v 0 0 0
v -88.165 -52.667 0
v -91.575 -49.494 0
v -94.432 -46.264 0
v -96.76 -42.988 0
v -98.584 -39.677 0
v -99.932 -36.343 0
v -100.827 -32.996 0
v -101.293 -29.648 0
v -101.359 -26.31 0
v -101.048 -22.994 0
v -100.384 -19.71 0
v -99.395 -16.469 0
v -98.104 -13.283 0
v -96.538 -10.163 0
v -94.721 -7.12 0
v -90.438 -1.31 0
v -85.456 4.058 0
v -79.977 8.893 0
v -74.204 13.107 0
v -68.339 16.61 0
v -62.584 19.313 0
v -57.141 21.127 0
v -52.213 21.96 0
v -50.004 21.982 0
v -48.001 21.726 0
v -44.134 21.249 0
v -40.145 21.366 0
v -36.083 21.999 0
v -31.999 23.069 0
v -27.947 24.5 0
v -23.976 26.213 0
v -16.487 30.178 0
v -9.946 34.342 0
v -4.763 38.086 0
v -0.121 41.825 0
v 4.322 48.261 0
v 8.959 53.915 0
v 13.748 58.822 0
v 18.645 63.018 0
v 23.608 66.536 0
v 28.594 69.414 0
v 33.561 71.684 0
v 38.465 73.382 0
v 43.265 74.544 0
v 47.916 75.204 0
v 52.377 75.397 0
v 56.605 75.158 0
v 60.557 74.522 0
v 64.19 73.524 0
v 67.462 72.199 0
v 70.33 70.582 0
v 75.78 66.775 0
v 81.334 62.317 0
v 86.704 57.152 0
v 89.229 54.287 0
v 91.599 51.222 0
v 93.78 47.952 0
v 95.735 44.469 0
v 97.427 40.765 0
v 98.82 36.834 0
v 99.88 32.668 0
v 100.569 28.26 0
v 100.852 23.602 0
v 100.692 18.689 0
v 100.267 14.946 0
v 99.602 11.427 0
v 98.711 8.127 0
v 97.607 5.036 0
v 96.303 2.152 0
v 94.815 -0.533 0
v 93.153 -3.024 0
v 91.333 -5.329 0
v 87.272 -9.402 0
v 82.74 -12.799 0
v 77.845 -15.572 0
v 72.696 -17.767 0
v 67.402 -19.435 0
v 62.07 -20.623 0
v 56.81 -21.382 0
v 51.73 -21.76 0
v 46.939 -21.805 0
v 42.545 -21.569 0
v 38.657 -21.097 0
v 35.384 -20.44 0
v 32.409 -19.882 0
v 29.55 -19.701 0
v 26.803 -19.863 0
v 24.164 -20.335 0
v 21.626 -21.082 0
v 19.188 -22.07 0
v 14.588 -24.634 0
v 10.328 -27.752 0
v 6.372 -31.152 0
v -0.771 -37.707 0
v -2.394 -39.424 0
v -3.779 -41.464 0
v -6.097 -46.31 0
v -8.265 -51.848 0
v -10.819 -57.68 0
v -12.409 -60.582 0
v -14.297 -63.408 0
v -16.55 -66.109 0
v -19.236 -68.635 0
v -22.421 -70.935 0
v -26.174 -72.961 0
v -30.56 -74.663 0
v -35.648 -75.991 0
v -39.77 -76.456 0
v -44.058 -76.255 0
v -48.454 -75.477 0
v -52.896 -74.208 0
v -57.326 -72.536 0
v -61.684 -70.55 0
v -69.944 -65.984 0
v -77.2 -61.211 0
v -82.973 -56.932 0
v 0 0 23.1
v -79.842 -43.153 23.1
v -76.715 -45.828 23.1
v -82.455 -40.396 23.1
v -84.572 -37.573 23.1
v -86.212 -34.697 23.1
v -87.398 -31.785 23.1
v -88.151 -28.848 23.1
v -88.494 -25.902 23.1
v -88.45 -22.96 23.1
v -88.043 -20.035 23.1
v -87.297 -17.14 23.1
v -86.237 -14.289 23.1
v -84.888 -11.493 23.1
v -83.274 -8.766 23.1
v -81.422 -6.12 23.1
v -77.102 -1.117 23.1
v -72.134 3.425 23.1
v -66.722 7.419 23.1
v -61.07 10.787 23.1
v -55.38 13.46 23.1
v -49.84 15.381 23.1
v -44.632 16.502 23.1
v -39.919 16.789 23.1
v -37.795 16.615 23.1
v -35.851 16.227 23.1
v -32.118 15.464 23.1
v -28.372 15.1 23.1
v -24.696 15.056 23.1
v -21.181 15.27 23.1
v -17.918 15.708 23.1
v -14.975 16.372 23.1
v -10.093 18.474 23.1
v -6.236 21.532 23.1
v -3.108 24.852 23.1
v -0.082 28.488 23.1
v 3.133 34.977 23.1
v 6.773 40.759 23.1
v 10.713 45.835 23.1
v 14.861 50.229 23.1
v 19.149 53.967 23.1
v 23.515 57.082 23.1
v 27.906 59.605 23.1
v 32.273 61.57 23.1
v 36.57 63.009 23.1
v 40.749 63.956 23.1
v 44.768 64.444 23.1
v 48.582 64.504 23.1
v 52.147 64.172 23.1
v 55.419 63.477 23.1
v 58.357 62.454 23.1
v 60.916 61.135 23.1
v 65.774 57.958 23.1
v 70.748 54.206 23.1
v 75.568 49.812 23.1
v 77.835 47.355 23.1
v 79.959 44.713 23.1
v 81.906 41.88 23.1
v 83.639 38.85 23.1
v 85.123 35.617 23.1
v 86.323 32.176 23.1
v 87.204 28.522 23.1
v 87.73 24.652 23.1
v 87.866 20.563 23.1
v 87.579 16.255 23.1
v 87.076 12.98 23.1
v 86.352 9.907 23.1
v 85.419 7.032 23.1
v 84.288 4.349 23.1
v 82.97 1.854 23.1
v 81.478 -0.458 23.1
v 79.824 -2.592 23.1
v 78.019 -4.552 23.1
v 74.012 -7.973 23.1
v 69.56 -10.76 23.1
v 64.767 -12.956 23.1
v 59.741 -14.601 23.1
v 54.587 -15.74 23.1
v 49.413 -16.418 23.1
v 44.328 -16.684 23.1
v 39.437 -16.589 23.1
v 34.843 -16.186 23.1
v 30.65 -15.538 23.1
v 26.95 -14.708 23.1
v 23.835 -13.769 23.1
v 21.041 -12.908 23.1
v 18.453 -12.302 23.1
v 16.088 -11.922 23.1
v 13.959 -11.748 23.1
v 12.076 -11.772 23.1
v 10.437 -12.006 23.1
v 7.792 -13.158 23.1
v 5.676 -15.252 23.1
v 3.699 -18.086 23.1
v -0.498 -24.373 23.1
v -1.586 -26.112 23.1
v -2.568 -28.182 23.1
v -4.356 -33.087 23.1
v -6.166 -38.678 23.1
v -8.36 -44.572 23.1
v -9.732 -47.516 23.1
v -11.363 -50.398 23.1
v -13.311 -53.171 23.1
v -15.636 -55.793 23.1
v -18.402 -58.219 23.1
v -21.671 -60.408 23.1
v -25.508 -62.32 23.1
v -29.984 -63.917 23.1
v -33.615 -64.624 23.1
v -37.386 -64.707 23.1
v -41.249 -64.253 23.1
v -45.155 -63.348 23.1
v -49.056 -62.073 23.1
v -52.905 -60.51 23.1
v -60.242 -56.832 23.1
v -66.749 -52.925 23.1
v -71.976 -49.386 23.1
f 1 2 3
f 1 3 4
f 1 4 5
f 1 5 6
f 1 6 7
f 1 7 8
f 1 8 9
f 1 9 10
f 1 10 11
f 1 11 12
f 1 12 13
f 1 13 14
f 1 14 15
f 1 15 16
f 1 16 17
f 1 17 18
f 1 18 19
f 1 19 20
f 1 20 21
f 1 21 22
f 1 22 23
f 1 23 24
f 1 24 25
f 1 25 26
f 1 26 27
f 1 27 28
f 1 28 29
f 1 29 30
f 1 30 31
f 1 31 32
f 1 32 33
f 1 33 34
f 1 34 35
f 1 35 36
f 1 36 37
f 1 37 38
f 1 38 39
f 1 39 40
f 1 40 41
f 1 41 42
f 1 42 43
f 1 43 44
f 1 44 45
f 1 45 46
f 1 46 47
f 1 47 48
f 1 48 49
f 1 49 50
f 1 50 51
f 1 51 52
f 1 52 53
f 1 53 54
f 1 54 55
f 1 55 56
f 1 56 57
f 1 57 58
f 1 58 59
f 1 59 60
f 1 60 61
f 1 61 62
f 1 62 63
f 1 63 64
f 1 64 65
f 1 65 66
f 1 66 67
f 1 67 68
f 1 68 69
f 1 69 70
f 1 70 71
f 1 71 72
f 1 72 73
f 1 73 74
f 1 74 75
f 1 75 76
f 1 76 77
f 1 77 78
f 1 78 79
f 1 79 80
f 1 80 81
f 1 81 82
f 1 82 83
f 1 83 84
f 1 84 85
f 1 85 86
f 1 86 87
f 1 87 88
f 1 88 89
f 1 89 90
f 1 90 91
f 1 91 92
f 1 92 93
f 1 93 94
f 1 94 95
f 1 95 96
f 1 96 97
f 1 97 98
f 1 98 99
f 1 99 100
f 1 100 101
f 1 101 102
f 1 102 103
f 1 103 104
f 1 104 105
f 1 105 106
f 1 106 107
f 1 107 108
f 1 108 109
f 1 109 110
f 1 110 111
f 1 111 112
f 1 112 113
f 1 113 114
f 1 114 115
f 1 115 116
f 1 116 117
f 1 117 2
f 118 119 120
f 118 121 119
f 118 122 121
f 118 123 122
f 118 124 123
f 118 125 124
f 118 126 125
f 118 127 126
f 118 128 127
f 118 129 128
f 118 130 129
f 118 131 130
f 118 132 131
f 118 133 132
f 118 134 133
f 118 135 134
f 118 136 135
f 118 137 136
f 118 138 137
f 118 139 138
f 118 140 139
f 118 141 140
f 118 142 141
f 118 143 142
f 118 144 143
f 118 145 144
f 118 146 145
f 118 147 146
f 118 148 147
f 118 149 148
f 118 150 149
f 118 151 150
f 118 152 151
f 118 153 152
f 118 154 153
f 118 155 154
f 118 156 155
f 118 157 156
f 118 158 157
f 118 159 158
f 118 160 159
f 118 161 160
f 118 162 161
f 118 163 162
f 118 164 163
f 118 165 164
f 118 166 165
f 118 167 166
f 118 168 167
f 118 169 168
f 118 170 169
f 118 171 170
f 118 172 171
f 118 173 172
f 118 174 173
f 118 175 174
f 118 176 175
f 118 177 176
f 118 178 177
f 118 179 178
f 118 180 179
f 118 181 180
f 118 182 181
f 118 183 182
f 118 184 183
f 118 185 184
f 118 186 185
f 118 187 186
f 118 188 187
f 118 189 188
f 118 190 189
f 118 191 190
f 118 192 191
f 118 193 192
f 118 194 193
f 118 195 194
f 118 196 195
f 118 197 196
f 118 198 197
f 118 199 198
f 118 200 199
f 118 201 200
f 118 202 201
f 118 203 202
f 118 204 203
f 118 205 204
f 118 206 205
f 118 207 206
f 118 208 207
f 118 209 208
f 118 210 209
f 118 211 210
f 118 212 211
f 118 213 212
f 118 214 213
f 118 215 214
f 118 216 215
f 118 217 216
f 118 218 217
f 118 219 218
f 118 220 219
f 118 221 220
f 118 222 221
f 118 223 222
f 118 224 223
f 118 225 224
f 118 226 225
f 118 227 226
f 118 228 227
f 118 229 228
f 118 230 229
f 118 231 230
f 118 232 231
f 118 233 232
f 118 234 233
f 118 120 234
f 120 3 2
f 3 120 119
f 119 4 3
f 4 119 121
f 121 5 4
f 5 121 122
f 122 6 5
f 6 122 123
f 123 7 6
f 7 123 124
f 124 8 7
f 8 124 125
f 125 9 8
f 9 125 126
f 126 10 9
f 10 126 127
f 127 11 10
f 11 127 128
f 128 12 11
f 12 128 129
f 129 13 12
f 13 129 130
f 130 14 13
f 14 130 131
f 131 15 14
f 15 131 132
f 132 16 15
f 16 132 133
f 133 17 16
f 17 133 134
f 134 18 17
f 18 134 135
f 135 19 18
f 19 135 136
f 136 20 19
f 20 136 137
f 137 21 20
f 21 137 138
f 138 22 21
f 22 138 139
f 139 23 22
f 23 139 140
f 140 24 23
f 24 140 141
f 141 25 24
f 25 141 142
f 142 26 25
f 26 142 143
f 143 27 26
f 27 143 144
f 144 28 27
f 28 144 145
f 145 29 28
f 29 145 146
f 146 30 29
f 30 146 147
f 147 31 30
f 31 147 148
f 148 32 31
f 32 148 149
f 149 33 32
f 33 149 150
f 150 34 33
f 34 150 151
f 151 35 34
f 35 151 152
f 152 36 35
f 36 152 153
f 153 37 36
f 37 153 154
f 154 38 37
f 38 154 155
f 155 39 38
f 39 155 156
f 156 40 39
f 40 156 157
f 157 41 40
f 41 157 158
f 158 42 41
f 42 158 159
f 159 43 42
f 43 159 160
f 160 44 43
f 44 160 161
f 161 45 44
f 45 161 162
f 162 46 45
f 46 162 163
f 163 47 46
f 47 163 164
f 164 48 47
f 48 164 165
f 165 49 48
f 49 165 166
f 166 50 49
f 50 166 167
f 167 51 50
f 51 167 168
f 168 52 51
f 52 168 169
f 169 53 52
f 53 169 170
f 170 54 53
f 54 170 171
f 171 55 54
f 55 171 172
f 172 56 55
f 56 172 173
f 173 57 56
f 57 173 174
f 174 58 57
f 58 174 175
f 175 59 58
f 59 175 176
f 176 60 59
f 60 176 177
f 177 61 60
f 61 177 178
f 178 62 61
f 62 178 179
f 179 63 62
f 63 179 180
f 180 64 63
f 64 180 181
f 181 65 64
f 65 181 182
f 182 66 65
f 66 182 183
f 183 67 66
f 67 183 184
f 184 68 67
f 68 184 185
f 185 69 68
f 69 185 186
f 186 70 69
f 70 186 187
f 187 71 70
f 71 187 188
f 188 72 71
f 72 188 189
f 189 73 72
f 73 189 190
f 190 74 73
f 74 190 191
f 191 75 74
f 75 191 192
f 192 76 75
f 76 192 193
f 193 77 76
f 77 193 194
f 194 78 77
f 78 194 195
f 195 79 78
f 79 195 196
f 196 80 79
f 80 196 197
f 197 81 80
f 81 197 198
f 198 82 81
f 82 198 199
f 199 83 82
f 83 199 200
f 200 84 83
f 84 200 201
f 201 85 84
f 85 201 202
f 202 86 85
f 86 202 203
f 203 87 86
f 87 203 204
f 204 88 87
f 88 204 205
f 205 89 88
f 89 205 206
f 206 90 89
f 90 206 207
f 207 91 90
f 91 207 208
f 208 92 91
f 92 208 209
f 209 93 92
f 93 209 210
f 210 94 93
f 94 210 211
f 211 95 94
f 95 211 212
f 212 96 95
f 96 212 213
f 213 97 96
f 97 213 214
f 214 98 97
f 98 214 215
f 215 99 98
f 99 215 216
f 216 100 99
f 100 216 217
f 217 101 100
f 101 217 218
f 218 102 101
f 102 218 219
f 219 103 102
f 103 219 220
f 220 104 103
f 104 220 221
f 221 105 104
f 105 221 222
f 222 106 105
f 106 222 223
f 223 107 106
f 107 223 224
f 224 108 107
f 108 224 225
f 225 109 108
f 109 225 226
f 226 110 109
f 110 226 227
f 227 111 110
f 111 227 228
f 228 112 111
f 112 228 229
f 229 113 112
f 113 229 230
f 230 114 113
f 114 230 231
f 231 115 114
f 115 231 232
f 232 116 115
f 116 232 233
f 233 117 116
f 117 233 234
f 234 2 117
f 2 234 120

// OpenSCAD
rotate([0,0,30]) scale([0.77,0.77,0.77]) hill2Polyhedron(height=30, angle=30);

module hill2Polyhedron(height = 1.0, angle = 0) {
	rotate([0,0,55])
	assign(inset = height * tan(angle))
	polyhedron(points = [
		[-78.118000, 108.102500, 0.000000],
		[-74.399000, 112.873500, 0.000000],
		[-70.543000, 116.935500, 0.000000],
		[-66.568000, 120.318500, 0.000000],
		[-62.491000, 123.053500, 0.000000],
		[-58.330000, 125.174500, 0.000000],
		[-54.101000, 126.710500, 0.000000],
		[-49.823000, 127.693500, 0.000000],
		[-45.512000, 128.155500, 0.000000],
		[-41.186000, 128.128500, 0.000000],
		[-36.862000, 127.641500, 0.000000],
		[-32.557000, 126.728500, 0.000000],
		[-28.289000, 125.419500, 0.000000],
		[-24.075000, 123.746500, 0.000000],
		[-19.933000, 121.740500, 0.000000],
		[-11.931000, 116.856500, 0.000000],
		[-4.423000, 111.018500, 0.000000],
		[2.453000, 104.477500, 0.000000],
		[8.558000, 97.485500, 0.000000],
		[13.754000, 90.294500, 0.000000],
		[17.903000, 83.154500, 0.000000],
		[20.865000, 76.318500, 0.000000],
		[22.501000, 70.036500, 0.000000],
		[22.780000, 67.181500, 0.000000],
		[22.675000, 64.560500, 0.000000],
		[22.496000, 59.504500, 0.000000],
		[23.099000, 54.356500, 0.000000],
		[24.377000, 49.172500, 0.000000],
		[26.224000, 44.010500, 0.000000],
		[28.534000, 38.929500, 0.000000],
		[31.200000, 33.986500, 0.000000],
		[37.177000, 24.746500, 0.000000],
		[43.305000, 16.754500, 0.000000],
		[48.735000, 10.472500, 0.000000],
		[54.098000, 4.890500, 0.000000],
		[62.927000, -0.129500, 0.000000],
		[70.767000, -5.488500, 0.000000],
		[77.658000, -11.128500, 0.000000],
		[83.640000, -16.989500, 0.000000],
		[88.754000, -23.012500, 0.000000],
		[93.041000, -29.137500, 0.000000],
		[96.540000, -35.306500, 0.000000],
		[99.293000, -41.458500, 0.000000],
		[101.339000, -47.536500, 0.000000],
		[102.719000, -53.479500, 0.000000],
		[103.474000, -59.229500, 0.000000],
		[103.643000, -64.726500, 0.000000],
		[103.268000, -69.911500, 0.000000],
		[102.388000, -74.724500, 0.000000],
		[101.044000, -79.107500, 0.000000],
		[99.277000, -83.000500, 0.000000],
		[94.968000, -90.483500, 0.000000],
		[89.830000, -98.173500, 0.000000],
		[83.755000, -105.704500, 0.000000],
		[80.334000, -109.295500, 0.000000],
		[76.637000, -112.709500, 0.000000],
		[72.653000, -115.901500, 0.000000],
		[68.368000, -118.824500, 0.000000],
		[63.768000, -121.432500, 0.000000],
		[58.840000, -123.680500, 0.000000],
		[53.570000, -125.522500, 0.000000],
		[47.945000, -126.913500, 0.000000],
		[41.951000, -127.806500, 0.000000],
		[35.576000, -128.155500, 0.000000],
		[30.686000, -128.029500, 0.000000],
		[26.058000, -127.567500, 0.000000],
		[21.687000, -126.788500, 0.000000],
		[17.564000, -125.709500, 0.000000],
		[13.685000, -124.349500, 0.000000],
		[10.043000, -122.727500, 0.000000],
		[6.631000, -120.860500, 0.000000],
		[3.444000, -118.766500, 0.000000],
		[-2.285000, -113.973500, 0.000000],
		[-7.194000, -108.494500, 0.000000],
		[-11.335000, -102.475500, 0.000000],
		[-14.758000, -96.062500, 0.000000],
		[-17.515000, -89.401500, 0.000000],
		[-19.656000, -82.637500, 0.000000],
		[-21.233000, -75.918500, 0.000000],
		[-22.297000, -69.389500, 0.000000],
		[-22.898000, -63.195500, 0.000000],
		[-23.089000, -57.484500, 0.000000],
		[-22.919000, -52.400500, 0.000000],
		[-22.440000, -48.091500, 0.000000],
		[-22.054000, -44.179500, 0.000000],
		[-22.143000, -40.460500, 0.000000],
		[-22.664000, -36.925500, 0.000000],
		[-23.574000, -33.563500, 0.000000],
		[-24.827000, -30.365500, 0.000000],
		[-26.382000, -27.322500, 0.000000],
		[-30.219000, -21.661500, 0.000000],
		[-34.735000, -16.503500, 0.000000],
		[-39.582000, -11.769500, 0.000000],
		[-48.871000, -3.270500, 0.000000],
		[-51.276000, -1.364500, 0.000000],
		[-54.072000, 0.195500, 0.000000],
		[-60.604000, 2.646500, 0.000000],
		[-68.015000, 4.824500, 0.000000],
		[-75.849000, 7.468500, 0.000000],
		[-79.783000, 9.196500, 0.000000],
		[-83.653000, 11.319500, 0.000000],
		[-87.402000, 13.928500, 0.000000],
		[-90.974000, 17.117500, 0.000000],
		[-94.311000, 20.978500, 0.000000],
		[-97.357000, 25.604500, 0.000000],
		[-100.055000, 31.086500, 0.000000],
		[-102.349000, 37.518500, 0.000000],
		[-103.417000, 42.798500, 0.000000],
		[-103.643000, 48.369500, 0.000000],
		[-103.133000, 54.144500, 0.000000],
		[-101.995000, 60.035500, 0.000000],
		[-100.333000, 65.955500, 0.000000],
		[-98.257000, 71.818500, 0.000000],
		[-93.284000, 83.021500, 0.000000],
		[-87.930000, 92.949500, 0.000000],
		[-83.048000, 100.903500, 0.000000],
		[-78.118 - inset*sin(atan(-78.118/108.1025)), 108.1025 - inset*cos(atan(-78.118/108.1025)), height],
		[-74.399 - inset*sin(atan(-74.399/112.8735)), 112.8735 - inset*cos(atan(-74.399/112.8735)), height],
		[-70.543 - inset*sin(atan(-70.543/116.9355)), 116.9355 - inset*cos(atan(-70.543/116.9355)), height],
		[-66.568 - inset*sin(atan(-66.568/120.3185)), 120.3185 - inset*cos(atan(-66.568/120.3185)), height],
		[-62.491 - inset*sin(atan(-62.491/123.0535)), 123.0535 - inset*cos(atan(-62.491/123.0535)), height],
		[-58.33 - inset*sin(atan(-58.33/125.1745)), 125.1745 - inset*cos(atan(-58.33/125.1745)), height],
		[-54.101 - inset*sin(atan(-54.101/126.7105)), 126.7105 - inset*cos(atan(-54.101/126.7105)), height],
		[-49.823 - inset*sin(atan(-49.823/127.6935)), 127.6935 - inset*cos(atan(-49.823/127.6935)), height],
		[-45.512 - inset*sin(atan(-45.512/128.1555)), 128.1555 - inset*cos(atan(-45.512/128.1555)), height],
		[-41.186 - inset*sin(atan(-41.186/128.1285)), 128.1285 - inset*cos(atan(-41.186/128.1285)), height],
		[-36.862 - inset*sin(atan(-36.862/127.6415)), 127.6415 - inset*cos(atan(-36.862/127.6415)), height],
		[-32.557 - inset*sin(atan(-32.557/126.7285)), 126.7285 - inset*cos(atan(-32.557/126.7285)), height],
		[-28.289 - inset*sin(atan(-28.289/125.4195)), 125.4195 - inset*cos(atan(-28.289/125.4195)), height],
		[-24.075 - inset*sin(atan(-24.075/123.7465)), 123.7465 - inset*cos(atan(-24.075/123.7465)), height],
		[-19.933 - inset*sin(atan(-19.933/121.7405)), 121.7405 - inset*cos(atan(-19.933/121.7405)), height],
		[-11.931 - inset*sin(atan(-11.931/116.8565)), 116.8565 - inset*cos(atan(-11.931/116.8565)), height],
		[-4.42300000000002 - inset*sin(atan(-4.42300000000002/111.0185)), 111.0185 - inset*cos(atan(-4.42300000000002/111.0185)), height],
		[2.45299999999999 - inset*sin(atan(2.45299999999999/104.4775)), 104.4775 - inset*cos(atan(2.45299999999999/104.4775)), height],
		[8.55799999999999 - inset*sin(atan(8.55799999999999/97.4855)), 97.4855 - inset*cos(atan(8.55799999999999/97.4855)), height],
		[13.754 - inset*sin(atan(13.754/90.2945)), 90.2945 - inset*cos(atan(13.754/90.2945)), height],
		[17.903 - inset*sin(atan(17.903/83.1545)), 83.1545 - inset*cos(atan(17.903/83.1545)), height],
		[20.865 - inset*sin(atan(20.865/76.3185)), 76.3185 - inset*cos(atan(20.865/76.3185)), height],
		[22.501 - inset*sin(atan(22.501/70.0365)), 70.0365 - inset*cos(atan(22.501/70.0365)), height],
		[22.78 - inset*sin(atan(22.78/67.1815)), 67.1815 - inset*cos(atan(22.78/67.1815)), height],
		[22.675 - inset*sin(atan(22.675/64.5605)), 64.5605 - inset*cos(atan(22.675/64.5605)), height],
		[22.496 - inset*sin(atan(22.496/59.5045)), 59.5045 - inset*cos(atan(22.496/59.5045)), height],
		[23.099 - inset*sin(atan(23.099/54.3565)), 54.3565 - inset*cos(atan(23.099/54.3565)), height],
		[24.377 - inset*sin(atan(24.377/49.1725)), 49.1725 - inset*cos(atan(24.377/49.1725)), height],
		[26.224 - inset*sin(atan(26.224/44.0105)), 44.0105 - inset*cos(atan(26.224/44.0105)), height],
		[28.534 - inset*sin(atan(28.534/38.9295)), 38.9295 - inset*cos(atan(28.534/38.9295)), height],
		[31.2 - inset*sin(atan(31.2/33.9865)), 33.9865 - inset*cos(atan(31.2/33.9865)), height],
		[37.177 - inset*sin(atan(37.177/24.7465)), 24.7465 - inset*cos(atan(37.177/24.7465)), height],
		[43.305 - inset*sin(atan(43.305/16.7545)), 16.7545 - inset*cos(atan(43.305/16.7545)), height],
		[48.735 - inset*sin(atan(48.735/10.4725)), 10.4725 - inset*cos(atan(48.735/10.4725)), height],
		[54.098 - inset*sin(atan(54.098/4.89049999999997)), 4.89049999999997 - inset*cos(atan(54.098/4.89049999999997)), height],
		[62.927 + inset*sin(atan(62.927/-0.129500000000023)), -0.129500000000023 + inset*cos(atan(62.927/-0.129500000000023)), height],
		[70.767 + inset*sin(atan(70.767/-5.48850000000002)), -5.48850000000002 + inset*cos(atan(70.767/-5.48850000000002)), height],
		[77.658 + inset*sin(atan(77.658/-11.1285)), -11.1285 + inset*cos(atan(77.658/-11.1285)), height],
		[83.64 + inset*sin(atan(83.64/-16.9895)), -16.9895 + inset*cos(atan(83.64/-16.9895)), height],
		[88.754 + inset*sin(atan(88.754/-23.0125)), -23.0125 + inset*cos(atan(88.754/-23.0125)), height],
		[93.041 + inset*sin(atan(93.041/-29.1375)), -29.1375 + inset*cos(atan(93.041/-29.1375)), height],
		[96.54 + inset*sin(atan(96.54/-35.3065)), -35.3065 + inset*cos(atan(96.54/-35.3065)), height],
		[99.293 + inset*sin(atan(99.293/-41.4585)), -41.4585 + inset*cos(atan(99.293/-41.4585)), height],
		[101.339 + inset*sin(atan(101.339/-47.5365)), -47.5365 + inset*cos(atan(101.339/-47.5365)), height],
		[102.719 + inset*sin(atan(102.719/-53.4795)), -53.4795 + inset*cos(atan(102.719/-53.4795)), height],
		[103.474 + inset*sin(atan(103.474/-59.2295)), -59.2295 + inset*cos(atan(103.474/-59.2295)), height],
		[103.643 + inset*sin(atan(103.643/-64.7265)), -64.7265 + inset*cos(atan(103.643/-64.7265)), height],
		[103.268 + inset*sin(atan(103.268/-69.9115)), -69.9115 + inset*cos(atan(103.268/-69.9115)), height],
		[102.388 + inset*sin(atan(102.388/-74.7245)), -74.7245 + inset*cos(atan(102.388/-74.7245)), height],
		[101.044 + inset*sin(atan(101.044/-79.1075)), -79.1075 + inset*cos(atan(101.044/-79.1075)), height],
		[99.277 + inset*sin(atan(99.277/-83.0005)), -83.0005 + inset*cos(atan(99.277/-83.0005)), height],
		[94.968 + inset*sin(atan(94.968/-90.4835)), -90.4835 + inset*cos(atan(94.968/-90.4835)), height],
		[89.83 + inset*sin(atan(89.83/-98.1735)), -98.1735 + inset*cos(atan(89.83/-98.1735)), height],
		[83.755 + inset*sin(atan(83.755/-105.7045)), -105.7045 + inset*cos(atan(83.755/-105.7045)), height],
		[80.334 + inset*sin(atan(80.334/-109.2955)), -109.2955 + inset*cos(atan(80.334/-109.2955)), height],
		[76.637 + inset*sin(atan(76.637/-112.7095)), -112.7095 + inset*cos(atan(76.637/-112.7095)), height],
		[72.653 + inset*sin(atan(72.653/-115.9015)), -115.9015 + inset*cos(atan(72.653/-115.9015)), height],
		[68.368 + inset*sin(atan(68.368/-118.8245)), -118.8245 + inset*cos(atan(68.368/-118.8245)), height],
		[63.768 + inset*sin(atan(63.768/-121.4325)), -121.4325 + inset*cos(atan(63.768/-121.4325)), height],
		[58.84 + inset*sin(atan(58.84/-123.6805)), -123.6805 + inset*cos(atan(58.84/-123.6805)), height],
		[53.57 + inset*sin(atan(53.57/-125.5225)), -125.5225 + inset*cos(atan(53.57/-125.5225)), height],
		[47.945 + inset*sin(atan(47.945/-126.9135)), -126.9135 + inset*cos(atan(47.945/-126.9135)), height],
		[41.951 + inset*sin(atan(41.951/-127.8065)), -127.8065 + inset*cos(atan(41.951/-127.8065)), height],
		[35.576 + inset*sin(atan(35.576/-128.1555)), -128.1555 + inset*cos(atan(35.576/-128.1555)), height],
		[30.686 + inset*sin(atan(30.686/-128.0295)), -128.0295 + inset*cos(atan(30.686/-128.0295)), height],
		[26.058 + inset*sin(atan(26.058/-127.5675)), -127.5675 + inset*cos(atan(26.058/-127.5675)), height],
		[21.687 + inset*sin(atan(21.687/-126.7885)), -126.7885 + inset*cos(atan(21.687/-126.7885)), height],
		[17.564 + inset*sin(atan(17.564/-125.7095)), -125.7095 + inset*cos(atan(17.564/-125.7095)), height],
		[13.685 + inset*sin(atan(13.685/-124.3495)), -124.3495 + inset*cos(atan(13.685/-124.3495)), height],
		[10.043 + inset*sin(atan(10.043/-122.7275)), -122.7275 + inset*cos(atan(10.043/-122.7275)), height],
		[6.63099999999999 + inset*sin(atan(6.63099999999999/-120.8605)), -120.8605 + inset*cos(atan(6.63099999999999/-120.8605)), height],
		[3.44399999999999 + inset*sin(atan(3.44399999999999/-118.7665)), -118.7665 + inset*cos(atan(3.44399999999999/-118.7665)), height],
		[-2.28500000000001 + inset*sin(atan(-2.28500000000001/-113.9735)), -113.9735 + inset*cos(atan(-2.28500000000001/-113.9735)), height],
		[-7.19400000000002 + inset*sin(atan(-7.19400000000002/-108.4945)), -108.4945 + inset*cos(atan(-7.19400000000002/-108.4945)), height],
		[-11.335 + inset*sin(atan(-11.335/-102.4755)), -102.4755 + inset*cos(atan(-11.335/-102.4755)), height],
		[-14.758 + inset*sin(atan(-14.758/-96.0625)), -96.0625 + inset*cos(atan(-14.758/-96.0625)), height],
		[-17.515 + inset*sin(atan(-17.515/-89.4015)), -89.4015 + inset*cos(atan(-17.515/-89.4015)), height],
		[-19.656 + inset*sin(atan(-19.656/-82.6375)), -82.6375 + inset*cos(atan(-19.656/-82.6375)), height],
		[-21.233 + inset*sin(atan(-21.233/-75.9185)), -75.9185 + inset*cos(atan(-21.233/-75.9185)), height],
		[-22.297 + inset*sin(atan(-22.297/-69.3895)), -69.3895 + inset*cos(atan(-22.297/-69.3895)), height],
		[-22.898 + inset*sin(atan(-22.898/-63.1955)), -63.1955 + inset*cos(atan(-22.898/-63.1955)), height],
		[-23.089 + inset*sin(atan(-23.089/-57.4845)), -57.4845 + inset*cos(atan(-23.089/-57.4845)), height],
		[-22.919 + inset*sin(atan(-22.919/-52.4005)), -52.4005 + inset*cos(atan(-22.919/-52.4005)), height],
		[-22.44 + inset*sin(atan(-22.44/-48.0915)), -48.0915 + inset*cos(atan(-22.44/-48.0915)), height],
		[-22.054 + inset*sin(atan(-22.054/-44.1795)), -44.1795 + inset*cos(atan(-22.054/-44.1795)), height],
		[-22.143 + inset*sin(atan(-22.143/-40.4605)), -40.4605 + inset*cos(atan(-22.143/-40.4605)), height],
		[-22.664 + inset*sin(atan(-22.664/-36.9255)), -36.9255 + inset*cos(atan(-22.664/-36.9255)), height],
		[-23.574 + inset*sin(atan(-23.574/-33.5635)), -33.5635 + inset*cos(atan(-23.574/-33.5635)), height],
		[-24.827 + inset*sin(atan(-24.827/-30.3655)), -30.3655 + inset*cos(atan(-24.827/-30.3655)), height],
		[-26.382 + inset*sin(atan(-26.382/-27.3225)), -27.3225 + inset*cos(atan(-26.382/-27.3225)), height],
		[-30.219 + inset*sin(atan(-30.219/-21.6615)), -21.6615 + inset*cos(atan(-30.219/-21.6615)), height],
		[-34.735 + inset*sin(atan(-34.735/-16.5035)), -16.5035 + inset*cos(atan(-34.735/-16.5035)), height],
		[-39.582 + inset*sin(atan(-39.582/-11.7695)), -11.7695 + inset*cos(atan(-39.582/-11.7695)), height],
		[-48.871 + inset*sin(atan(-48.871/-3.27050000000002)), -3.27050000000002 + inset*cos(atan(-48.871/-3.27050000000002)), height],
		[-51.276 + inset*sin(atan(-51.276/-1.36450000000002)), -1.36450000000002 + inset*cos(atan(-51.276/-1.36450000000002)), height],
		[-54.072 - inset*sin(atan(-54.072/0.195499999999978)), 0.195499999999978 - inset*cos(atan(-54.072/0.195499999999978)), height],
		[-60.604 - inset*sin(atan(-60.604/2.64649999999997)), 2.64649999999997 - inset*cos(atan(-60.604/2.64649999999997)), height],
		[-68.015 - inset*sin(atan(-68.015/4.82449999999998)), 4.82449999999998 - inset*cos(atan(-68.015/4.82449999999998)), height],
		[-75.849 - inset*sin(atan(-75.849/7.46849999999998)), 7.46849999999998 - inset*cos(atan(-75.849/7.46849999999998)), height],
		[-79.783 - inset*sin(atan(-79.783/9.19649999999998)), 9.19649999999998 - inset*cos(atan(-79.783/9.19649999999998)), height],
		[-83.653 - inset*sin(atan(-83.653/11.3195)), 11.3195 - inset*cos(atan(-83.653/11.3195)), height],
		[-87.402 - inset*sin(atan(-87.402/13.9285)), 13.9285 - inset*cos(atan(-87.402/13.9285)), height],
		[-90.974 - inset*sin(atan(-90.974/17.1175)), 17.1175 - inset*cos(atan(-90.974/17.1175)), height],
		[-94.311 - inset*sin(atan(-94.311/20.9785)), 20.9785 - inset*cos(atan(-94.311/20.9785)), height],
		[-97.357 - inset*sin(atan(-97.357/25.6045)), 25.6045 - inset*cos(atan(-97.357/25.6045)), height],
		[-100.055 - inset*sin(atan(-100.055/31.0865)), 31.0865 - inset*cos(atan(-100.055/31.0865)), height],
		[-102.349 - inset*sin(atan(-102.349/37.5185)), 37.5185 - inset*cos(atan(-102.349/37.5185)), height],
		[-103.417 - inset*sin(atan(-103.417/42.7985)), 42.7985 - inset*cos(atan(-103.417/42.7985)), height],
		[-103.643 - inset*sin(atan(-103.643/48.3695)), 48.3695 - inset*cos(atan(-103.643/48.3695)), height],
		[-103.133 - inset*sin(atan(-103.133/54.1445)), 54.1445 - inset*cos(atan(-103.133/54.1445)), height],
		[-101.995 - inset*sin(atan(-101.995/60.0355)), 60.0355 - inset*cos(atan(-101.995/60.0355)), height],
		[-100.333 - inset*sin(atan(-100.333/65.9555)), 65.9555 - inset*cos(atan(-100.333/65.9555)), height],
		[-98.257 - inset*sin(atan(-98.257/71.8185)), 71.8185 - inset*cos(atan(-98.257/71.8185)), height],
		[-93.284 - inset*sin(atan(-93.284/83.0215)), 83.0215 - inset*cos(atan(-93.284/83.0215)), height],
		[-87.93 - inset*sin(atan(-87.93/92.9495)), 92.9495 - inset*cos(atan(-87.93/92.9495)), height],
		[-83.048 - inset*sin(atan(-83.048/100.9035)), 100.9035 - inset*cos(atan(-83.048/100.9035)), height],
		[0, 0, 0], [0, 0, height] // centers
		],
	triangles = [
		[1, 0, 232], // bottom
		[2, 1, 232], // bottom
		[3, 2, 232], // bottom
		[4, 3, 232], // bottom
		[5, 4, 232], // bottom
		[6, 5, 232], // bottom
		[7, 6, 232], // bottom
		[8, 7, 232], // bottom
		[9, 8, 232], // bottom
		[10, 9, 232], // bottom
		[11, 10, 232], // bottom
		[12, 11, 232], // bottom
		[13, 12, 232], // bottom
		[14, 13, 232], // bottom
		[15, 14, 232], // bottom
		[16, 15, 232], // bottom
		[17, 16, 232], // bottom
		[18, 17, 232], // bottom
		[19, 18, 232], // bottom
		[20, 19, 232], // bottom
		[21, 20, 232], // bottom
		[22, 21, 232], // bottom
		[23, 22, 232], // bottom
		[24, 23, 232], // bottom
		[25, 24, 232], // bottom
		[26, 25, 232], // bottom
		[27, 26, 232], // bottom
		[28, 27, 232], // bottom
		[29, 28, 232], // bottom
		[30, 29, 232], // bottom
		[31, 30, 232], // bottom
		[32, 31, 232], // bottom
		[33, 32, 232], // bottom
		[34, 33, 232], // bottom
		[35, 34, 232], // bottom
		[36, 35, 232], // bottom
		[37, 36, 232], // bottom
		[38, 37, 232], // bottom
		[39, 38, 232], // bottom
		[40, 39, 232], // bottom
		[41, 40, 232], // bottom
		[42, 41, 232], // bottom
		[43, 42, 232], // bottom
		[44, 43, 232], // bottom
		[45, 44, 232], // bottom
		[46, 45, 232], // bottom
		[47, 46, 232], // bottom
		[48, 47, 232], // bottom
		[49, 48, 232], // bottom
		[50, 49, 232], // bottom
		[51, 50, 232], // bottom
		[52, 51, 232], // bottom
		[53, 52, 232], // bottom
		[54, 53, 232], // bottom
		[55, 54, 232], // bottom
		[56, 55, 232], // bottom
		[57, 56, 232], // bottom
		[58, 57, 232], // bottom
		[59, 58, 232], // bottom
		[60, 59, 232], // bottom
		[61, 60, 232], // bottom
		[62, 61, 232], // bottom
		[63, 62, 232], // bottom
		[64, 63, 232], // bottom
		[65, 64, 232], // bottom
		[66, 65, 232], // bottom
		[67, 66, 232], // bottom
		[68, 67, 232], // bottom
		[69, 68, 232], // bottom
		[70, 69, 232], // bottom
		[71, 70, 232], // bottom
		[72, 71, 232], // bottom
		[73, 72, 232], // bottom
		[74, 73, 232], // bottom
		[75, 74, 232], // bottom
		[76, 75, 232], // bottom
		[77, 76, 232], // bottom
		[78, 77, 232], // bottom
		[79, 78, 232], // bottom
		[80, 79, 232], // bottom
		[81, 80, 232], // bottom
		[82, 81, 232], // bottom
		[83, 82, 232], // bottom
		[84, 83, 232], // bottom
		[85, 84, 232], // bottom
		[86, 85, 232], // bottom
		[87, 86, 232], // bottom
		[88, 87, 232], // bottom
		[89, 88, 232], // bottom
		[90, 89, 232], // bottom
		[91, 90, 232], // bottom
		[92, 91, 232], // bottom
		[93, 92, 232], // bottom
		[94, 93, 232], // bottom
		[95, 94, 232], // bottom
		[96, 95, 232], // bottom
		[97, 96, 232], // bottom
		[98, 97, 232], // bottom
		[99, 98, 232], // bottom
		[100, 99, 232], // bottom
		[101, 100, 232], // bottom
		[102, 101, 232], // bottom
		[103, 102, 232], // bottom
		[104, 103, 232], // bottom
		[105, 104, 232], // bottom
		[106, 105, 232], // bottom
		[107, 106, 232], // bottom
		[108, 107, 232], // bottom
		[109, 108, 232], // bottom
		[110, 109, 232], // bottom
		[111, 110, 232], // bottom
		[112, 111, 232], // bottom
		[113, 112, 232], // bottom
		[114, 113, 232], // bottom
		[115, 114, 232], // bottom
		[0, 115, 232], // bottom
		[116, 117, 233], // top
		[117, 118, 233], // top
		[118, 119, 233], // top
		[119, 120, 233], // top
		[120, 121, 233], // top
		[121, 122, 233], // top
		[122, 123, 233], // top
		[123, 124, 233], // top
		[124, 125, 233], // top
		[125, 126, 233], // top
		[126, 127, 233], // top
		[127, 128, 233], // top
		[128, 129, 233], // top
		[129, 130, 233], // top
		[130, 131, 233], // top
		[131, 132, 233], // top
		[132, 133, 233], // top
		[133, 134, 233], // top
		[134, 135, 233], // top
		[135, 136, 233], // top
		[136, 137, 233], // top
		[137, 138, 233], // top
		[138, 139, 233], // top
		[139, 140, 233], // top
		[140, 141, 233], // top
		[141, 142, 233], // top
		[142, 143, 233], // top
		[143, 144, 233], // top
		[144, 145, 233], // top
		[145, 146, 233], // top
		[146, 147, 233], // top
		[147, 148, 233], // top
		[148, 149, 233], // top
		[149, 150, 233], // top
		[150, 151, 233], // top
		[151, 152, 233], // top
		[152, 153, 233], // top
		[153, 154, 233], // top
		[154, 155, 233], // top
		[155, 156, 233], // top
		[156, 157, 233], // top
		[157, 158, 233], // top
		[158, 159, 233], // top
		[159, 160, 233], // top
		[160, 161, 233], // top
		[161, 162, 233], // top
		[162, 163, 233], // top
		[163, 164, 233], // top
		[164, 165, 233], // top
		[165, 166, 233], // top
		[166, 167, 233], // top
		[167, 168, 233], // top
		[168, 169, 233], // top
		[169, 170, 233], // top
		[170, 171, 233], // top
		[171, 172, 233], // top
		[172, 173, 233], // top
		[173, 174, 233], // top
		[174, 175, 233], // top
		[175, 176, 233], // top
		[176, 177, 233], // top
		[177, 178, 233], // top
		[178, 179, 233], // top
		[179, 180, 233], // top
		[180, 181, 233], // top
		[181, 182, 233], // top
		[182, 183, 233], // top
		[183, 184, 233], // top
		[184, 185, 233], // top
		[185, 186, 233], // top
		[186, 187, 233], // top
		[187, 188, 233], // top
		[188, 189, 233], // top
		[189, 190, 233], // top
		[190, 191, 233], // top
		[191, 192, 233], // top
		[192, 193, 233], // top
		[193, 194, 233], // top
		[194, 195, 233], // top
		[195, 196, 233], // top
		[196, 197, 233], // top
		[197, 198, 233], // top
		[198, 199, 233], // top
		[199, 200, 233], // top
		[200, 201, 233], // top
		[201, 202, 233], // top
		[202, 203, 233], // top
		[203, 204, 233], // top
		[204, 205, 233], // top
		[205, 206, 233], // top
		[206, 207, 233], // top
		[207, 208, 233], // top
		[208, 209, 233], // top
		[209, 210, 233], // top
		[210, 211, 233], // top
		[211, 212, 233], // top
		[212, 213, 233], // top
		[213, 214, 233], // top
		[214, 215, 233], // top
		[215, 216, 233], // top
		[216, 217, 233], // top
		[217, 218, 233], // top
		[218, 219, 233], // top
		[219, 220, 233], // top
		[220, 221, 233], // top
		[221, 222, 233], // top
		[222, 223, 233], // top
		[223, 224, 233], // top
		[224, 225, 233], // top
		[225, 226, 233], // top
		[226, 227, 233], // top
		[227, 228, 233], // top
		[228, 229, 233], // top
		[229, 230, 233], // top
		[230, 231, 233], // top
		[231, 116, 233], // top
		[0, 1, 116], // side
		[117, 116, 1], // side
		[1, 2, 117], // side
		[118, 117, 2], // side
		[2, 3, 118], // side
		[119, 118, 3], // side
		[3, 4, 119], // side
		[120, 119, 4], // side
		[4, 5, 120], // side
		[121, 120, 5], // side
		[5, 6, 121], // side
		[122, 121, 6], // side
		[6, 7, 122], // side
		[123, 122, 7], // side
		[7, 8, 123], // side
		[124, 123, 8], // side
		[8, 9, 124], // side
		[125, 124, 9], // side
		[9, 10, 125], // side
		[126, 125, 10], // side
		[10, 11, 126], // side
		[127, 126, 11], // side
		[11, 12, 127], // side
		[128, 127, 12], // side
		[12, 13, 128], // side
		[129, 128, 13], // side
		[13, 14, 129], // side
		[130, 129, 14], // side
		[14, 15, 130], // side
		[131, 130, 15], // side
		[15, 16, 131], // side
		[132, 131, 16], // side
		[16, 17, 132], // side
		[133, 132, 17], // side
		[17, 18, 133], // side
		[134, 133, 18], // side
		[18, 19, 134], // side
		[135, 134, 19], // side
		[19, 20, 135], // side
		[136, 135, 20], // side
		[20, 21, 136], // side
		[137, 136, 21], // side
		[21, 22, 137], // side
		[138, 137, 22], // side
		[22, 23, 138], // side
		[139, 138, 23], // side
		[23, 24, 139], // side
		[140, 139, 24], // side
		[24, 25, 140], // side
		[141, 140, 25], // side
		[25, 26, 141], // side
		[142, 141, 26], // side
		[26, 27, 142], // side
		[143, 142, 27], // side
		[27, 28, 143], // side
		[144, 143, 28], // side
		[28, 29, 144], // side
		[145, 144, 29], // side
		[29, 30, 145], // side
		[146, 145, 30], // side
		[30, 31, 146], // side
		[147, 146, 31], // side
		[31, 32, 147], // side
		[148, 147, 32], // side
		[32, 33, 148], // side
		[149, 148, 33], // side
		[33, 34, 149], // side
		[150, 149, 34], // side
		[34, 35, 150], // side
		[151, 150, 35], // side
		[35, 36, 151], // side
		[152, 151, 36], // side
		[36, 37, 152], // side
		[153, 152, 37], // side
		[37, 38, 153], // side
		[154, 153, 38], // side
		[38, 39, 154], // side
		[155, 154, 39], // side
		[39, 40, 155], // side
		[156, 155, 40], // side
		[40, 41, 156], // side
		[157, 156, 41], // side
		[41, 42, 157], // side
		[158, 157, 42], // side
		[42, 43, 158], // side
		[159, 158, 43], // side
		[43, 44, 159], // side
		[160, 159, 44], // side
		[44, 45, 160], // side
		[161, 160, 45], // side
		[45, 46, 161], // side
		[162, 161, 46], // side
		[46, 47, 162], // side
		[163, 162, 47], // side
		[47, 48, 163], // side
		[164, 163, 48], // side
		[48, 49, 164], // side
		[165, 164, 49], // side
		[49, 50, 165], // side
		[166, 165, 50], // side
		[50, 51, 166], // side
		[167, 166, 51], // side
		[51, 52, 167], // side
		[168, 167, 52], // side
		[52, 53, 168], // side
		[169, 168, 53], // side
		[53, 54, 169], // side
		[170, 169, 54], // side
		[54, 55, 170], // side
		[171, 170, 55], // side
		[55, 56, 171], // side
		[172, 171, 56], // side
		[56, 57, 172], // side
		[173, 172, 57], // side
		[57, 58, 173], // side
		[174, 173, 58], // side
		[58, 59, 174], // side
		[175, 174, 59], // side
		[59, 60, 175], // side
		[176, 175, 60], // side
		[60, 61, 176], // side
		[177, 176, 61], // side
		[61, 62, 177], // side
		[178, 177, 62], // side
		[62, 63, 178], // side
		[179, 178, 63], // side
		[63, 64, 179], // side
		[180, 179, 64], // side
		[64, 65, 180], // side
		[181, 180, 65], // side
		[65, 66, 181], // side
		[182, 181, 66], // side
		[66, 67, 182], // side
		[183, 182, 67], // side
		[67, 68, 183], // side
		[184, 183, 68], // side
		[68, 69, 184], // side
		[185, 184, 69], // side
		[69, 70, 185], // side
		[186, 185, 70], // side
		[70, 71, 186], // side
		[187, 186, 71], // side
		[71, 72, 187], // side
		[188, 187, 72], // side
		[72, 73, 188], // side
		[189, 188, 73], // side
		[73, 74, 189], // side
		[190, 189, 74], // side
		[74, 75, 190], // side
		[191, 190, 75], // side
		[75, 76, 191], // side
		[192, 191, 76], // side
		[76, 77, 192], // side
		[193, 192, 77], // side
		[77, 78, 193], // side
		[194, 193, 78], // side
		[78, 79, 194], // side
		[195, 194, 79], // side
		[79, 80, 195], // side
		[196, 195, 80], // side
		[80, 81, 196], // side
		[197, 196, 81], // side
		[81, 82, 197], // side
		[198, 197, 82], // side
		[82, 83, 198], // side
		[199, 198, 83], // side
		[83, 84, 199], // side
		[200, 199, 84], // side
		[84, 85, 200], // side
		[201, 200, 85], // side
		[85, 86, 201], // side
		[202, 201, 86], // side
		[86, 87, 202], // side
		[203, 202, 87], // side
		[87, 88, 203], // side
		[204, 203, 88], // side
		[88, 89, 204], // side
		[205, 204, 89], // side
		[89, 90, 205], // side
		[206, 205, 90], // side
		[90, 91, 206], // side
		[207, 206, 91], // side
		[91, 92, 207], // side
		[208, 207, 92], // side
		[92, 93, 208], // side
		[209, 208, 93], // side
		[93, 94, 209], // side
		[210, 209, 94], // side
		[94, 95, 210], // side
		[211, 210, 95], // side
		[95, 96, 211], // side
		[212, 211, 96], // side
		[96, 97, 212], // side
		[213, 212, 97], // side
		[97, 98, 213], // side
		[214, 213, 98], // side
		[98, 99, 214], // side
		[215, 214, 99], // side
		[99, 100, 215], // side
		[216, 215, 100], // side
		[100, 101, 216], // side
		[217, 216, 101], // side
		[101, 102, 217], // side
		[218, 217, 102], // side
		[102, 103, 218], // side
		[219, 218, 103], // side
		[103, 104, 219], // side
		[220, 219, 104], // side
		[104, 105, 220], // side
		[221, 220, 105], // side
		[105, 106, 221], // side
		[222, 221, 106], // side
		[106, 107, 222], // side
		[223, 222, 107], // side
		[107, 108, 223], // side
		[224, 223, 108], // side
		[108, 109, 224], // side
		[225, 224, 109], // side
		[109, 110, 225], // side
		[226, 225, 110], // side
		[110, 111, 226], // side
		[227, 226, 111], // side
		[111, 112, 227], // side
		[228, 227, 112], // side
		[112, 113, 228], // side
		[229, 228, 113], // side
		[113, 114, 229], // side
		[230, 229, 114], // side
		[114, 115, 230], // side
		[231, 230, 115], // side
		[115, 0, 231], // side
		[116, 231, 0], // side
		]);
}
